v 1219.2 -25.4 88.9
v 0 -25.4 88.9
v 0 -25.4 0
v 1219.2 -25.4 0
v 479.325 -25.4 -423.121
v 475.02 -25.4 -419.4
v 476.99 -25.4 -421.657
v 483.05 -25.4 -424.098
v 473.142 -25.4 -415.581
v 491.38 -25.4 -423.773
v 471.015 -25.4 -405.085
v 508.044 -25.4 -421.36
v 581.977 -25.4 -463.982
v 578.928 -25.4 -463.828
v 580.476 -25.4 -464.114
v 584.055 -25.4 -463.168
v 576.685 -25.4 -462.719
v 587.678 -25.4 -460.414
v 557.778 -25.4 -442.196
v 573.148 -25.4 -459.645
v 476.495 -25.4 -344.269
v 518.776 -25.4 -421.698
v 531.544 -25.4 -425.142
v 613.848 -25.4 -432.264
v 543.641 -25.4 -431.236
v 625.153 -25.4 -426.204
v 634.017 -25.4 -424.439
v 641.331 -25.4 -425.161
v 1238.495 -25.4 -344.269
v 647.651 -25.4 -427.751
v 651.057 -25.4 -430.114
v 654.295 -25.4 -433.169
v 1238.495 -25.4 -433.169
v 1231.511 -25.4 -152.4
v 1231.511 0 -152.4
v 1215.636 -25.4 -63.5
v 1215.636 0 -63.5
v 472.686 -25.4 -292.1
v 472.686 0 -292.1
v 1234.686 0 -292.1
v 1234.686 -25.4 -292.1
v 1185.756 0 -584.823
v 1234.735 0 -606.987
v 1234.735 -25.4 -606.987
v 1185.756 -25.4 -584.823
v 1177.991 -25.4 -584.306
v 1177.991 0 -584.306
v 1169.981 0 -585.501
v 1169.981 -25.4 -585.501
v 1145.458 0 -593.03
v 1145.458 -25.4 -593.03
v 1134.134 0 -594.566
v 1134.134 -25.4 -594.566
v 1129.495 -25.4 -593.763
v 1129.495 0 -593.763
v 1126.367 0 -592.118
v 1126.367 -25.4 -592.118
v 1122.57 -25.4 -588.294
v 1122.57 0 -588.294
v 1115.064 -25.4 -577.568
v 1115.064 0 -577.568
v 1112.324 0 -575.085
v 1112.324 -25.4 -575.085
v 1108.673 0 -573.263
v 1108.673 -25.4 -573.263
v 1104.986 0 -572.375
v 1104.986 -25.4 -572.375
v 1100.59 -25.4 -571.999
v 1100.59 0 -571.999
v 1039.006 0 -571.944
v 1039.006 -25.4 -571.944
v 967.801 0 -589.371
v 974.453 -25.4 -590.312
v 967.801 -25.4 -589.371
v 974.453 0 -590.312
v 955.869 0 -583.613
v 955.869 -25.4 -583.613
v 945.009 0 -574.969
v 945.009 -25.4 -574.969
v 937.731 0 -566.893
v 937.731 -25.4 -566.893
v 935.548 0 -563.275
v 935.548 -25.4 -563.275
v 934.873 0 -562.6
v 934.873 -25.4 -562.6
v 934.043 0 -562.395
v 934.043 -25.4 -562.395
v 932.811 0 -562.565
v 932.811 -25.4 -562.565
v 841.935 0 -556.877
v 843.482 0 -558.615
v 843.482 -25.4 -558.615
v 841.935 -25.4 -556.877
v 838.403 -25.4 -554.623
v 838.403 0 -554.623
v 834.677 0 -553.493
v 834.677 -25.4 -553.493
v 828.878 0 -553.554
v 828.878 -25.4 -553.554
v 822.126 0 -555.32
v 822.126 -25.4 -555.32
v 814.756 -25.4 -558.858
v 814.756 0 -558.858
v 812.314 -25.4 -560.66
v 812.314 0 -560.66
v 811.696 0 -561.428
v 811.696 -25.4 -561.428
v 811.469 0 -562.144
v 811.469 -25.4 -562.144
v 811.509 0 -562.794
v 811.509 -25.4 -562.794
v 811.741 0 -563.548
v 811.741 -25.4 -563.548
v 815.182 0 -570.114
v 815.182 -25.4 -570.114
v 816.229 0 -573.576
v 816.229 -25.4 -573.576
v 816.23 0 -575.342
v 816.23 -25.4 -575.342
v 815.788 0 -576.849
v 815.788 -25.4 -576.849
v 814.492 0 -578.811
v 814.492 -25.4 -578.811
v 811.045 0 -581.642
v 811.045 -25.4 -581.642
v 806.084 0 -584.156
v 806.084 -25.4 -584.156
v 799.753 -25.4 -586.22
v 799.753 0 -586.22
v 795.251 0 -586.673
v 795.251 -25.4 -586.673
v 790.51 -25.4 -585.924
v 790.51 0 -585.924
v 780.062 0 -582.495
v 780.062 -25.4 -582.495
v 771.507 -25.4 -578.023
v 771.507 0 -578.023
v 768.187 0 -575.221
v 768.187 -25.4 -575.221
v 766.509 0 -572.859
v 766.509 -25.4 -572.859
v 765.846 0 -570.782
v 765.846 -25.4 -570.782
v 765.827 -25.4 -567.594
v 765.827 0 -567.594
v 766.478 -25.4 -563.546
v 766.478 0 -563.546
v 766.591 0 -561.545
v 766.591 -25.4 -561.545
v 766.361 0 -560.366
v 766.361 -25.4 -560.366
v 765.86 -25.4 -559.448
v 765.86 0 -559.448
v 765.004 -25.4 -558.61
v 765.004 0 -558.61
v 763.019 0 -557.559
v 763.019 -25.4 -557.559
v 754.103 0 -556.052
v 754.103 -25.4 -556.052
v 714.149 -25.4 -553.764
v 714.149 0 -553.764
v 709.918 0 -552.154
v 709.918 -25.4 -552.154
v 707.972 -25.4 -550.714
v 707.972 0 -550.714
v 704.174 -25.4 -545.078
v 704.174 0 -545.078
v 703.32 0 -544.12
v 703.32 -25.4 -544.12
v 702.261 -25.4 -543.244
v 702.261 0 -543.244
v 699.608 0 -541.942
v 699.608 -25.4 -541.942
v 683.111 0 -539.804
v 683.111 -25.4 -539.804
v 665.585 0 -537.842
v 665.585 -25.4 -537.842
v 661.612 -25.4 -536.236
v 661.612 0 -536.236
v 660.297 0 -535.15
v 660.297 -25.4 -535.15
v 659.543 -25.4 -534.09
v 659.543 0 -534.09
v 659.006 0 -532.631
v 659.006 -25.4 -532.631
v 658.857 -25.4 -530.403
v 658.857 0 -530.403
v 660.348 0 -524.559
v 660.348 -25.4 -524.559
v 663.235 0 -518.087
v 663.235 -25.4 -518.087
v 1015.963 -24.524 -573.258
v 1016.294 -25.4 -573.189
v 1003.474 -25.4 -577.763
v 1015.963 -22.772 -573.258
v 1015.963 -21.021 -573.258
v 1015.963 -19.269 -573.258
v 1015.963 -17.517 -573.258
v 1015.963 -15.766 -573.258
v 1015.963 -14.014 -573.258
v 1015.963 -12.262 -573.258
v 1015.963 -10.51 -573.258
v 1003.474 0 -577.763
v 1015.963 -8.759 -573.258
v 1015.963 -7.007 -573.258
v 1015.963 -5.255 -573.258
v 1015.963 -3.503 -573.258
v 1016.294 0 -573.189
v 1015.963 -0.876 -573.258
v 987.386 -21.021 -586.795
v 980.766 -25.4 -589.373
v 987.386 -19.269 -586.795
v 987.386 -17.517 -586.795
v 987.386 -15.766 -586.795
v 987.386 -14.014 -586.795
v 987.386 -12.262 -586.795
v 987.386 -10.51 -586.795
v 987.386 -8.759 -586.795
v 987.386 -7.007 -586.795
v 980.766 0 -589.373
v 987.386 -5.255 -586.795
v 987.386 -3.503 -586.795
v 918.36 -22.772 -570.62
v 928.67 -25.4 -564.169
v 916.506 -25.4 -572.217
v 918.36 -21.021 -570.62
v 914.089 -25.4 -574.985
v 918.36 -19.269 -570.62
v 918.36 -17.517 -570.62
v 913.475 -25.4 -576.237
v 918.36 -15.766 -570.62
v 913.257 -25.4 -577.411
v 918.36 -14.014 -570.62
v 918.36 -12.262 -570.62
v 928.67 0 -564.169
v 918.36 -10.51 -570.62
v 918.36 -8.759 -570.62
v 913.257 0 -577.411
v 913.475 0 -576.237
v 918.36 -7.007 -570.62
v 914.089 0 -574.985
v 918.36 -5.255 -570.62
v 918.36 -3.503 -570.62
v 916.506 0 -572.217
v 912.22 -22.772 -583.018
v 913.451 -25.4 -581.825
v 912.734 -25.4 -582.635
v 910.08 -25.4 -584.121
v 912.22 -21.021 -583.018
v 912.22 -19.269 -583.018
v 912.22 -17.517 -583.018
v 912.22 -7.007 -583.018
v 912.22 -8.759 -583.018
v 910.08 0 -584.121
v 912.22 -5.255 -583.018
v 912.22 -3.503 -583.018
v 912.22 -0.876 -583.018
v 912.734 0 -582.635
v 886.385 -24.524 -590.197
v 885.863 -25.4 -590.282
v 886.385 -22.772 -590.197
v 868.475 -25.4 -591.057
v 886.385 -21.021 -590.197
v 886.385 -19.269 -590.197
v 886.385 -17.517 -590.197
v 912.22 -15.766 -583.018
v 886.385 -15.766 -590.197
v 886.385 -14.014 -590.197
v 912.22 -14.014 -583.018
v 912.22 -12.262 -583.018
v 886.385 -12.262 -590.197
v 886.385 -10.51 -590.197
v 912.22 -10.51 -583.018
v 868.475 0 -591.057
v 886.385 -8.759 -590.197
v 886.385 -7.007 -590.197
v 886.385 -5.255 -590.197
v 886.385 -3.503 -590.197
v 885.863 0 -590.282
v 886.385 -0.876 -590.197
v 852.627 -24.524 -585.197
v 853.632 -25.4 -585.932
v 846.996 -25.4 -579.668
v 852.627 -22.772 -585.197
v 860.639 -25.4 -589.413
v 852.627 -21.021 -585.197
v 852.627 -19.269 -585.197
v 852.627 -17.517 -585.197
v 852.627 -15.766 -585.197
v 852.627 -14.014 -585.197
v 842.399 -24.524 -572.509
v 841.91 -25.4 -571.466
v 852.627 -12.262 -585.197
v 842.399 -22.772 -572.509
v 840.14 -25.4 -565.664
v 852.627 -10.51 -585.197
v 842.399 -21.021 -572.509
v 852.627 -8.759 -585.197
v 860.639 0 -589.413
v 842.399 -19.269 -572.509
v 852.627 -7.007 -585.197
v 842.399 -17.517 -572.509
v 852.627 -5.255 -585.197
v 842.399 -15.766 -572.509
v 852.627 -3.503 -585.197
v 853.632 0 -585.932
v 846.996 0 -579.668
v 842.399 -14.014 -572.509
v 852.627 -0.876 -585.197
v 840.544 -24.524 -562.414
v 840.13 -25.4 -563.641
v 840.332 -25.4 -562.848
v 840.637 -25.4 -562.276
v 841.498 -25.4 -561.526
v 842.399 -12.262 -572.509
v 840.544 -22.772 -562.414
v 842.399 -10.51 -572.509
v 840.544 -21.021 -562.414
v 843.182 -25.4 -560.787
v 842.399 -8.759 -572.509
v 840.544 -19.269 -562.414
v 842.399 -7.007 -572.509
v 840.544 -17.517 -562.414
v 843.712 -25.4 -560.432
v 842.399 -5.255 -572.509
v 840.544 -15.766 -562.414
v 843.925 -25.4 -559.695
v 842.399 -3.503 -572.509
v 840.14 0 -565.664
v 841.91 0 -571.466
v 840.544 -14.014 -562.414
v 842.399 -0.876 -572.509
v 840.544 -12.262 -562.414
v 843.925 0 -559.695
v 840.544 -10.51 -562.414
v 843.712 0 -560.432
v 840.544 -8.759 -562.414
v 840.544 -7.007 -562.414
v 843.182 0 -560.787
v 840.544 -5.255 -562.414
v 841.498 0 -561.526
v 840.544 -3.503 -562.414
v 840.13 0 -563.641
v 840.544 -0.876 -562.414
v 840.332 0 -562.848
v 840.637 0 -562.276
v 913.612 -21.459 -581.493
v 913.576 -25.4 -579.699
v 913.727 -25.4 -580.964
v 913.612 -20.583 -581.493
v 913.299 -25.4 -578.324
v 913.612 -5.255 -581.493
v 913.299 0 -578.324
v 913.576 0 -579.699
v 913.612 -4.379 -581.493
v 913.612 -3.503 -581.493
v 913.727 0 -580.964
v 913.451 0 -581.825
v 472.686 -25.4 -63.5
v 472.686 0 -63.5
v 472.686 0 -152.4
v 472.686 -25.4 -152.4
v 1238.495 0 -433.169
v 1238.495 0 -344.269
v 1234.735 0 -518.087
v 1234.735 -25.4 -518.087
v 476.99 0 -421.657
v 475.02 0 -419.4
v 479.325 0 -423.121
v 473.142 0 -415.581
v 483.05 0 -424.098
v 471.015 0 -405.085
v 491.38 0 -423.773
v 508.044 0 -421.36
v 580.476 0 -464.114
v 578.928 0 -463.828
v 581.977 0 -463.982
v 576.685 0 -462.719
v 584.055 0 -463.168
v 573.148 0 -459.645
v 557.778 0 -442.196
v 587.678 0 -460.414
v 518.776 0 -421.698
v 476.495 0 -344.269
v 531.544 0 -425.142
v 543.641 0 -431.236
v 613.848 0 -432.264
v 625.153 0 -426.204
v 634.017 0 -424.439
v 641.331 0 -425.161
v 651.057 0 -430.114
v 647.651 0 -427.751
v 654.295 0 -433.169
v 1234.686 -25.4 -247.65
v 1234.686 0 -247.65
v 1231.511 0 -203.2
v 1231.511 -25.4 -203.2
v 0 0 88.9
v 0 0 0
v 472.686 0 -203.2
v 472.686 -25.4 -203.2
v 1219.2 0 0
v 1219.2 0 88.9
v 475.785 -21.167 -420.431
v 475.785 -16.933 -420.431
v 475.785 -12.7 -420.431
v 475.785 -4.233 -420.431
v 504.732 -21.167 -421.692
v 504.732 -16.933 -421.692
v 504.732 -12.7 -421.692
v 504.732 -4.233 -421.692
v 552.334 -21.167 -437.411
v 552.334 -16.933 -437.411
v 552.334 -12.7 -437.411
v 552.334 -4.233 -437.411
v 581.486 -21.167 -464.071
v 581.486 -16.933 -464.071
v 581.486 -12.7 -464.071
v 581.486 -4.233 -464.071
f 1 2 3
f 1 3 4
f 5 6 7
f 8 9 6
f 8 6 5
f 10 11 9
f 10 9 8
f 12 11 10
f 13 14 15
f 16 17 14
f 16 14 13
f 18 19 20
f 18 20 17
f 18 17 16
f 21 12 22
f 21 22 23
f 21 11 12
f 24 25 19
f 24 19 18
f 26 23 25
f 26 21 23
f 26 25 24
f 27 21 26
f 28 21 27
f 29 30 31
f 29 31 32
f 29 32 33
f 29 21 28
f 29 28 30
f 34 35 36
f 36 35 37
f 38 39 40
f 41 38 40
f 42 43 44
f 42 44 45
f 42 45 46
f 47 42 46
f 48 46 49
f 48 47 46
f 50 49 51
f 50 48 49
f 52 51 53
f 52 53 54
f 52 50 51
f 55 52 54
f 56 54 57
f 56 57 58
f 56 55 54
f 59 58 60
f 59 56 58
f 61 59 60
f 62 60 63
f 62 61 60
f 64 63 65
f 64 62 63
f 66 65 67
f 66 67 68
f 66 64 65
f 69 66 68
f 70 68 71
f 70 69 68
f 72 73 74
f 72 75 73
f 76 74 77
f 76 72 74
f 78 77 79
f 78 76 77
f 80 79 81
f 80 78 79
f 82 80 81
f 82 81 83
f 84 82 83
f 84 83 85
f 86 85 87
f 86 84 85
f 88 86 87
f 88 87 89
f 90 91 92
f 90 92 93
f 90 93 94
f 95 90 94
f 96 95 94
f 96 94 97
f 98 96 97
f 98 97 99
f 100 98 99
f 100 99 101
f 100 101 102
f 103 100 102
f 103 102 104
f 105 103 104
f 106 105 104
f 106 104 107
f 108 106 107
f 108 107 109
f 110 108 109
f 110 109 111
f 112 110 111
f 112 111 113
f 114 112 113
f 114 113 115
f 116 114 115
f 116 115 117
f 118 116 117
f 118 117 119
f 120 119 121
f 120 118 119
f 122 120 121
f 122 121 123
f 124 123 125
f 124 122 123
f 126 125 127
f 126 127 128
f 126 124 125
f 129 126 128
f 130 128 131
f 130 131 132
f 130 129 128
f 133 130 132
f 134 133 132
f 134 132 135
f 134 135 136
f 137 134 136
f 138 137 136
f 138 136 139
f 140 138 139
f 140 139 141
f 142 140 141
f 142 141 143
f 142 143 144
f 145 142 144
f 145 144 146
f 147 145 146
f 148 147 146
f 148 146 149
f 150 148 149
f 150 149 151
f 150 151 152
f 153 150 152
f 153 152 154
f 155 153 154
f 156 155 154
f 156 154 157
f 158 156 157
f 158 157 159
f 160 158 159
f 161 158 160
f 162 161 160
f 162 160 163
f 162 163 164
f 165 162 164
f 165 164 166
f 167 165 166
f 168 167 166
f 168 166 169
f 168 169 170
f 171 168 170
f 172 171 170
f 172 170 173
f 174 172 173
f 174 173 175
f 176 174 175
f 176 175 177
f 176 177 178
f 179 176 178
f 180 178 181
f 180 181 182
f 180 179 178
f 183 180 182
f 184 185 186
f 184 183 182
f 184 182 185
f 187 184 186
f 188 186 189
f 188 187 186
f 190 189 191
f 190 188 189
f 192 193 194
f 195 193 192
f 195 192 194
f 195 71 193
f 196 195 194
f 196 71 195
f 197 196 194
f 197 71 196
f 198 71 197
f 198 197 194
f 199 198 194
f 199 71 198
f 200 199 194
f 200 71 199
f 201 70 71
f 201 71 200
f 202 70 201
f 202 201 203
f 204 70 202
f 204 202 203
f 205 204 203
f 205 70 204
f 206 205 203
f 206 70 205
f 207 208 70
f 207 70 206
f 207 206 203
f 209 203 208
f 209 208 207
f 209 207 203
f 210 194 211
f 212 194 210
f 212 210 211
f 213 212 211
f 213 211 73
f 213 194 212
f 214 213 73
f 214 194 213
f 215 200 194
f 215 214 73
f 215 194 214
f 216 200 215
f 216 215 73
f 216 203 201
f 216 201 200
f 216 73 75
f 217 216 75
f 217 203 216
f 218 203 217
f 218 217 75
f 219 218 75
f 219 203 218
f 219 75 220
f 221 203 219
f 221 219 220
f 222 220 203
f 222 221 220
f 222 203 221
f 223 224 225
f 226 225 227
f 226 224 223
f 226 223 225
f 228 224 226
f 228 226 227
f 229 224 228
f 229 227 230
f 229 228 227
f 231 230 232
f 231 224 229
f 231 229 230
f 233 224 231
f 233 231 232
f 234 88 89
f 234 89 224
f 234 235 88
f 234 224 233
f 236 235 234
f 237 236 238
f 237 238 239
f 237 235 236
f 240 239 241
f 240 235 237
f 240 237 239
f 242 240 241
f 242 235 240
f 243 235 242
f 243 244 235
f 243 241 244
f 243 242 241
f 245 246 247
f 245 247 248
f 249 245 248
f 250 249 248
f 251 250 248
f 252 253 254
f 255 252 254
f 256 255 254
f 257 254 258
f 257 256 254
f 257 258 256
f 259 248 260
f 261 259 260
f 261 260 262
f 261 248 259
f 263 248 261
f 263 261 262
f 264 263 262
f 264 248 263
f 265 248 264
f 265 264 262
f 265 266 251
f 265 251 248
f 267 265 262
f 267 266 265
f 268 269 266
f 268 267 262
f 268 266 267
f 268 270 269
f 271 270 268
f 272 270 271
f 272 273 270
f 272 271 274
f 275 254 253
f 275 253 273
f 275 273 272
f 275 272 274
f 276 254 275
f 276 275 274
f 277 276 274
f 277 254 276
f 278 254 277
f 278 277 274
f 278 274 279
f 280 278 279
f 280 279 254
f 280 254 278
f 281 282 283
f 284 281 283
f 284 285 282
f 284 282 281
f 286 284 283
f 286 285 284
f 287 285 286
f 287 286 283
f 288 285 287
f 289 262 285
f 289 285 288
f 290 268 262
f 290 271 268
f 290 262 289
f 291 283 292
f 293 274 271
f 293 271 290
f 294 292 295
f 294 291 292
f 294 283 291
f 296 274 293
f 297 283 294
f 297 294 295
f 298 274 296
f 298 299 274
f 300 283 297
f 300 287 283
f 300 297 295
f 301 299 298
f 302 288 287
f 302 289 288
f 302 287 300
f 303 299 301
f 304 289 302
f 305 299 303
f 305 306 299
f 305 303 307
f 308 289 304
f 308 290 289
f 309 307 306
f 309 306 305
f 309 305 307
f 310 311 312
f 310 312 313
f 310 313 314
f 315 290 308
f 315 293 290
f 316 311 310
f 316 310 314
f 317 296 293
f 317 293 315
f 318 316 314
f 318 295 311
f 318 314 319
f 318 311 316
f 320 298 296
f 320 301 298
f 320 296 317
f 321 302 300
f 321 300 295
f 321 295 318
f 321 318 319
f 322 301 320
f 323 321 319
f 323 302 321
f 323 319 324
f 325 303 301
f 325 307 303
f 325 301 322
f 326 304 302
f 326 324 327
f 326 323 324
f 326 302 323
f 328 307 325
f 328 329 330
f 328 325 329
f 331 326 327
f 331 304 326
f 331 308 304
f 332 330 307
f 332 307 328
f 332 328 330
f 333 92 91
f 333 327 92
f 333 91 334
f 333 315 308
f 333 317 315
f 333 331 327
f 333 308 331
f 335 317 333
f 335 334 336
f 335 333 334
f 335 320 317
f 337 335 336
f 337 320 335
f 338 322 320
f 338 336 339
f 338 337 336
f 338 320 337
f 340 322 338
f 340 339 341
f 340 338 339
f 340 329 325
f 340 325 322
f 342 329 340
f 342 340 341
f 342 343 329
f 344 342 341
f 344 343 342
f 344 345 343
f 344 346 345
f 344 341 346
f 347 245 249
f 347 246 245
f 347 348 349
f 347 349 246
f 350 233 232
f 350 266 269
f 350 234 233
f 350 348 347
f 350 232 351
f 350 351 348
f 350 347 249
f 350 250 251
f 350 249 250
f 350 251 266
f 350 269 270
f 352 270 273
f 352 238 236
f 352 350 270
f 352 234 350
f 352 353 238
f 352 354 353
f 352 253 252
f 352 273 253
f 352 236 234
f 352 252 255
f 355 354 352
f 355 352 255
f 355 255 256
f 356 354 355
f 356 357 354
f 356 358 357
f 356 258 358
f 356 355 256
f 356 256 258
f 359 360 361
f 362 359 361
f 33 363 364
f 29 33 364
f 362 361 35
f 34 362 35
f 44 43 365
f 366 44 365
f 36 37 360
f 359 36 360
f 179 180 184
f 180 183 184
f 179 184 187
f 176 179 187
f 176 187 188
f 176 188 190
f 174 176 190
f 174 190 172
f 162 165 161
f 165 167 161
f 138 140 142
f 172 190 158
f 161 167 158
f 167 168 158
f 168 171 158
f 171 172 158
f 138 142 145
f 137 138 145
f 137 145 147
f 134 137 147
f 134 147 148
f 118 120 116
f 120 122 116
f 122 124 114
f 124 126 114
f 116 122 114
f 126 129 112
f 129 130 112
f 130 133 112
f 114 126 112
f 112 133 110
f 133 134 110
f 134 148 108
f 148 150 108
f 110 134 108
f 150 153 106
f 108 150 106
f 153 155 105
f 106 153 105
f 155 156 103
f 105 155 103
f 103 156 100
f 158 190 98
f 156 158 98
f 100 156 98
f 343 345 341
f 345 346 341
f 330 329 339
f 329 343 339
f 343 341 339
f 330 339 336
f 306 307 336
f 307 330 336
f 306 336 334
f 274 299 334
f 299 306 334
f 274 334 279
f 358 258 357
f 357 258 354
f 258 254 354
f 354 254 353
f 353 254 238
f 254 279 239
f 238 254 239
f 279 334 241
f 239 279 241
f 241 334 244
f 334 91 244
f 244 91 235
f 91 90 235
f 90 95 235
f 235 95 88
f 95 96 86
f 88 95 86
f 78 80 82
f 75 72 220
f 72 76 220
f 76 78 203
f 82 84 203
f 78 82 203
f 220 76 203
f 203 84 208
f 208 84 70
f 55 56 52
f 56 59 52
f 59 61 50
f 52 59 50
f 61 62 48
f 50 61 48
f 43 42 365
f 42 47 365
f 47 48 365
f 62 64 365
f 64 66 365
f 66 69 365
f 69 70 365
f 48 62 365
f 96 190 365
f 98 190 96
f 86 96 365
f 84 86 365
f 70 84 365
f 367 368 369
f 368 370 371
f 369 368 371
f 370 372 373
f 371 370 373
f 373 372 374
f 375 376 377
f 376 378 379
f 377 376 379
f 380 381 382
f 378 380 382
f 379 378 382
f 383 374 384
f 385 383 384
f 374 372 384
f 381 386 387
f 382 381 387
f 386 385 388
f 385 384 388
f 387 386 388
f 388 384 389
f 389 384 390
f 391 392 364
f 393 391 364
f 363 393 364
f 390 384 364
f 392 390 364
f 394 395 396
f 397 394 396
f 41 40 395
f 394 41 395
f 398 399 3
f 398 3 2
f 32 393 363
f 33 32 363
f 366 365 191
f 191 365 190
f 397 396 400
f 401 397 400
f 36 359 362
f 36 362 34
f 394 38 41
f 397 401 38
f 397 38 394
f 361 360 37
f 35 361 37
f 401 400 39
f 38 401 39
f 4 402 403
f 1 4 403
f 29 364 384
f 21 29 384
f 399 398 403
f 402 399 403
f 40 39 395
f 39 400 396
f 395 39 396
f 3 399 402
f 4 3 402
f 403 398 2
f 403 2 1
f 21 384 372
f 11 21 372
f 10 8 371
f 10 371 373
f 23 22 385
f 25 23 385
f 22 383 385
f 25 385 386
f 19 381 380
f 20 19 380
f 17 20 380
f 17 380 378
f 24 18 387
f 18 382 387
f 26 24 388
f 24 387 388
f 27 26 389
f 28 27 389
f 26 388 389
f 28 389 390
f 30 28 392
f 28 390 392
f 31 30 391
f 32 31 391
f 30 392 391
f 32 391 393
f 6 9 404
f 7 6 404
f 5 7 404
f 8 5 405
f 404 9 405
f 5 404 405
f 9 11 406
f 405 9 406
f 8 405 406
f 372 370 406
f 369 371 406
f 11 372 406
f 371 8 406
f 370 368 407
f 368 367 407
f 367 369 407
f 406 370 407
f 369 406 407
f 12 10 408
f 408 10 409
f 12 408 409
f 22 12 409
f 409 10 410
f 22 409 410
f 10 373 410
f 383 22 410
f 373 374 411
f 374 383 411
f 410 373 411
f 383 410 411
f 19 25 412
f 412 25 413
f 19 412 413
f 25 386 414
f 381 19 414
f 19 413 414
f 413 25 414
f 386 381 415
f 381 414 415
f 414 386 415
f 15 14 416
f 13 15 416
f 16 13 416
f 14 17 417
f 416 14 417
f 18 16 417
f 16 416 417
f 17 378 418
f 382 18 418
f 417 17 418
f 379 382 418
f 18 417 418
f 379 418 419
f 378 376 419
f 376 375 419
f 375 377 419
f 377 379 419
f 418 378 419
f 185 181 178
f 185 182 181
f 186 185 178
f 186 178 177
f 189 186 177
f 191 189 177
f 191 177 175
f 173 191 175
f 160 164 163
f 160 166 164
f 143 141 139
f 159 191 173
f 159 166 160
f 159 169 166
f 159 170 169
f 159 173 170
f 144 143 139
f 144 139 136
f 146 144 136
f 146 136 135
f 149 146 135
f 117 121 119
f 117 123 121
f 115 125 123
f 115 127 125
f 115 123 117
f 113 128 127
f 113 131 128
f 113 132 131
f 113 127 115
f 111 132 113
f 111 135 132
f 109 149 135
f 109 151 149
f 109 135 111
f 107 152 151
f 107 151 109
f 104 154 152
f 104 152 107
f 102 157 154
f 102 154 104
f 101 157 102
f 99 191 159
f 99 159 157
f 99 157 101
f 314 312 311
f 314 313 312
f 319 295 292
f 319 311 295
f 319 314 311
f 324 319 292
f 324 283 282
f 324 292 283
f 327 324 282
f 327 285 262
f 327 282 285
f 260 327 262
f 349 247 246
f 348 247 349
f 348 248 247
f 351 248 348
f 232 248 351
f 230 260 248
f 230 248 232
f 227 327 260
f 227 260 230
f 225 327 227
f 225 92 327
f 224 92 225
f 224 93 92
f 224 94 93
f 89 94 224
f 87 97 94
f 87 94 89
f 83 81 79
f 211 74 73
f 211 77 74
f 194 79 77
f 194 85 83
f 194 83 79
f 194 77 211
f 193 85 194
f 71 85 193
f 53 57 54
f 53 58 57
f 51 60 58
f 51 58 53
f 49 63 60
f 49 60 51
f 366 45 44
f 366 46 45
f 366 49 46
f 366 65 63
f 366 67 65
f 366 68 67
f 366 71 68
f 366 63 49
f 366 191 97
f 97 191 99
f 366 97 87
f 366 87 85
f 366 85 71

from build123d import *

# Parameters (mm, degrees)
F0_W     = 1219.2
F0_H     = 88.9
F1_DEPTH = 25.4
F3_DEPTH = 25.4
F5_DEPTH = 25.4
F7_DEPTH = 25.4
F9_DEPTH = 25.4


with BuildPart() as f1:
    # F0 (on Front) → F1 (new body)
    with BuildSketch(Plane.XZ):
        with Locations((609.6, 44.45)):
            Rectangle(F0_W, F0_H)
    extrude(amount=F1_DEPTH)


with BuildPart() as f3:
    # F2 (on Front) → F3 (new body)
    with BuildSketch(Plane.XZ):
        Polygon((1231.5109033108, -152.4), (1215.6359033108, -63.5), (472.6859033108, -63.5), (472.6859033108, -152.4), (1215.6359033108, -152.4), align=None)
    extrude(amount=F3_DEPTH)


with BuildPart() as f5:
    # F4 (on Front) → F5 (new body)
    with BuildSketch(Plane.XZ):
        Polygon((1234.6859033108, -247.65), (1231.5109033108, -203.2), (472.6859033108, -203.2), (472.6859033108, -292.1), (1234.6859033108, -292.1), align=None)
    extrude(amount=F5_DEPTH)


with BuildPart() as f7:
    # F6 (on Front) → F7 (new body)
    with BuildSketch(Plane.XZ):
        with BuildLine():
            Line((1238.4950275421, -344.2686839581), (476.4950275421, -344.2686839581))
            add(Edge.make_bspline(
                [(476.4950275421, -344.2686839581), (471.5617315727, -371.1672845679), (462.5505885059, -438.4450260098), (515.4985143119, -412.3723295594), (561.9703901672, -440.39730257), (581.9732878783, -477.5421320406), (607.3538537447, -426.9999778008), (641.7600714738, -419.5620238699), (654.2950275421, -433.1686839581)],
                knots=[0, 0, 0, 0, 0.2168443094, 0.3652436063, 0.547209463, 0.6773382476, 0.8378818434, 1, 1, 1, 1], degree=3))
            Line((654.2950275421, -433.1686839581), (1238.4950275421, -433.1686839581))
            Line((1238.4950275421, -433.1686839581), (1238.4950275421, -344.2686839581))
        make_face()
    extrude(amount=F7_DEPTH)


with BuildPart() as f9:
    # F8 (on Front) → F9 (new body)
    with BuildSketch(Plane.XZ):
        with BuildLine():
            Line((1234.7347106934, -606.9867910385), (1234.7347106934, -518.0867910385))
            Line((1234.7347106934, -518.0867910385), (663.2347106934, -518.0867910385))
            add(Edge.make_bspline(
                [(1234.7347106934, -606.9867910385), (1218.2828775309, -597.9654674262), (1190.3241738253, -582.6343787008), (1166.6441647671, -584.61509515), (1124.9078543263, -602.923709178), (1116.0655198037, -570.1040406035), (1087.1651201369, -573.0400456423), (1048.8493885343, -572.9732764449), (1006.6208041059, -569.3502803692), (973.3478950832, -603.4668921779), (935.7083712237, -567.2481303756), (935.3710784013, -559.3722797432), (909.5620610405, -574.5184848423), (916.2537453473, -582.5124881746), (899.4914327305, -587.7023125674), (852.533445913, -598.6797284909), (835.884529286, -560.7995808925), (846.94349372, -561.2199636962), (834.5787694691, -548.5122848847), (812.2057655711, -559.3432735285), (810.6078464194, -563.5661387818), (822.0054892547, -577.5874374539), (800.4291447021, -587.0070590309), (790.8048986835, -587.0356945962), (760.0886566595, -575.4248095562), (771.6149821069, -556.4120661548), (743.0857674883, -555.4793764985), (705.2030104126, -555.9324472635), (705.6984593323, -536.9969196147), (651.44660438, -542.944218704), (659.8709712567, -525.1798649817), (663.2347106934, -518.0867910385)],
                knots=[0, 0, 0, 0, 0.052190203, 0.0886934852, 0.1337423964, 0.1696082368, 0.2062611274, 0.252932132, 0.3003245392, 0.3466496297, 0.394607861, 0.4106298092, 0.4468089218, 0.4642021678, 0.49124079, 0.5416512579, 0.5809722526, 0.5957423593, 0.620340137, 0.6558842569, 0.6697166335, 0.6963285774, 0.7272586953, 0.7530570988, 0.7913118238, 0.8171102272, 0.852239532, 0.8964122943, 0.9217732732, 0.9687650918, 1, 1, 1, 1], degree=3))
        make_face()
    extrude(amount=F9_DEPTH)


solid = Compound([f1.part, f3.part, f5.part, f7.part, f9.part])
